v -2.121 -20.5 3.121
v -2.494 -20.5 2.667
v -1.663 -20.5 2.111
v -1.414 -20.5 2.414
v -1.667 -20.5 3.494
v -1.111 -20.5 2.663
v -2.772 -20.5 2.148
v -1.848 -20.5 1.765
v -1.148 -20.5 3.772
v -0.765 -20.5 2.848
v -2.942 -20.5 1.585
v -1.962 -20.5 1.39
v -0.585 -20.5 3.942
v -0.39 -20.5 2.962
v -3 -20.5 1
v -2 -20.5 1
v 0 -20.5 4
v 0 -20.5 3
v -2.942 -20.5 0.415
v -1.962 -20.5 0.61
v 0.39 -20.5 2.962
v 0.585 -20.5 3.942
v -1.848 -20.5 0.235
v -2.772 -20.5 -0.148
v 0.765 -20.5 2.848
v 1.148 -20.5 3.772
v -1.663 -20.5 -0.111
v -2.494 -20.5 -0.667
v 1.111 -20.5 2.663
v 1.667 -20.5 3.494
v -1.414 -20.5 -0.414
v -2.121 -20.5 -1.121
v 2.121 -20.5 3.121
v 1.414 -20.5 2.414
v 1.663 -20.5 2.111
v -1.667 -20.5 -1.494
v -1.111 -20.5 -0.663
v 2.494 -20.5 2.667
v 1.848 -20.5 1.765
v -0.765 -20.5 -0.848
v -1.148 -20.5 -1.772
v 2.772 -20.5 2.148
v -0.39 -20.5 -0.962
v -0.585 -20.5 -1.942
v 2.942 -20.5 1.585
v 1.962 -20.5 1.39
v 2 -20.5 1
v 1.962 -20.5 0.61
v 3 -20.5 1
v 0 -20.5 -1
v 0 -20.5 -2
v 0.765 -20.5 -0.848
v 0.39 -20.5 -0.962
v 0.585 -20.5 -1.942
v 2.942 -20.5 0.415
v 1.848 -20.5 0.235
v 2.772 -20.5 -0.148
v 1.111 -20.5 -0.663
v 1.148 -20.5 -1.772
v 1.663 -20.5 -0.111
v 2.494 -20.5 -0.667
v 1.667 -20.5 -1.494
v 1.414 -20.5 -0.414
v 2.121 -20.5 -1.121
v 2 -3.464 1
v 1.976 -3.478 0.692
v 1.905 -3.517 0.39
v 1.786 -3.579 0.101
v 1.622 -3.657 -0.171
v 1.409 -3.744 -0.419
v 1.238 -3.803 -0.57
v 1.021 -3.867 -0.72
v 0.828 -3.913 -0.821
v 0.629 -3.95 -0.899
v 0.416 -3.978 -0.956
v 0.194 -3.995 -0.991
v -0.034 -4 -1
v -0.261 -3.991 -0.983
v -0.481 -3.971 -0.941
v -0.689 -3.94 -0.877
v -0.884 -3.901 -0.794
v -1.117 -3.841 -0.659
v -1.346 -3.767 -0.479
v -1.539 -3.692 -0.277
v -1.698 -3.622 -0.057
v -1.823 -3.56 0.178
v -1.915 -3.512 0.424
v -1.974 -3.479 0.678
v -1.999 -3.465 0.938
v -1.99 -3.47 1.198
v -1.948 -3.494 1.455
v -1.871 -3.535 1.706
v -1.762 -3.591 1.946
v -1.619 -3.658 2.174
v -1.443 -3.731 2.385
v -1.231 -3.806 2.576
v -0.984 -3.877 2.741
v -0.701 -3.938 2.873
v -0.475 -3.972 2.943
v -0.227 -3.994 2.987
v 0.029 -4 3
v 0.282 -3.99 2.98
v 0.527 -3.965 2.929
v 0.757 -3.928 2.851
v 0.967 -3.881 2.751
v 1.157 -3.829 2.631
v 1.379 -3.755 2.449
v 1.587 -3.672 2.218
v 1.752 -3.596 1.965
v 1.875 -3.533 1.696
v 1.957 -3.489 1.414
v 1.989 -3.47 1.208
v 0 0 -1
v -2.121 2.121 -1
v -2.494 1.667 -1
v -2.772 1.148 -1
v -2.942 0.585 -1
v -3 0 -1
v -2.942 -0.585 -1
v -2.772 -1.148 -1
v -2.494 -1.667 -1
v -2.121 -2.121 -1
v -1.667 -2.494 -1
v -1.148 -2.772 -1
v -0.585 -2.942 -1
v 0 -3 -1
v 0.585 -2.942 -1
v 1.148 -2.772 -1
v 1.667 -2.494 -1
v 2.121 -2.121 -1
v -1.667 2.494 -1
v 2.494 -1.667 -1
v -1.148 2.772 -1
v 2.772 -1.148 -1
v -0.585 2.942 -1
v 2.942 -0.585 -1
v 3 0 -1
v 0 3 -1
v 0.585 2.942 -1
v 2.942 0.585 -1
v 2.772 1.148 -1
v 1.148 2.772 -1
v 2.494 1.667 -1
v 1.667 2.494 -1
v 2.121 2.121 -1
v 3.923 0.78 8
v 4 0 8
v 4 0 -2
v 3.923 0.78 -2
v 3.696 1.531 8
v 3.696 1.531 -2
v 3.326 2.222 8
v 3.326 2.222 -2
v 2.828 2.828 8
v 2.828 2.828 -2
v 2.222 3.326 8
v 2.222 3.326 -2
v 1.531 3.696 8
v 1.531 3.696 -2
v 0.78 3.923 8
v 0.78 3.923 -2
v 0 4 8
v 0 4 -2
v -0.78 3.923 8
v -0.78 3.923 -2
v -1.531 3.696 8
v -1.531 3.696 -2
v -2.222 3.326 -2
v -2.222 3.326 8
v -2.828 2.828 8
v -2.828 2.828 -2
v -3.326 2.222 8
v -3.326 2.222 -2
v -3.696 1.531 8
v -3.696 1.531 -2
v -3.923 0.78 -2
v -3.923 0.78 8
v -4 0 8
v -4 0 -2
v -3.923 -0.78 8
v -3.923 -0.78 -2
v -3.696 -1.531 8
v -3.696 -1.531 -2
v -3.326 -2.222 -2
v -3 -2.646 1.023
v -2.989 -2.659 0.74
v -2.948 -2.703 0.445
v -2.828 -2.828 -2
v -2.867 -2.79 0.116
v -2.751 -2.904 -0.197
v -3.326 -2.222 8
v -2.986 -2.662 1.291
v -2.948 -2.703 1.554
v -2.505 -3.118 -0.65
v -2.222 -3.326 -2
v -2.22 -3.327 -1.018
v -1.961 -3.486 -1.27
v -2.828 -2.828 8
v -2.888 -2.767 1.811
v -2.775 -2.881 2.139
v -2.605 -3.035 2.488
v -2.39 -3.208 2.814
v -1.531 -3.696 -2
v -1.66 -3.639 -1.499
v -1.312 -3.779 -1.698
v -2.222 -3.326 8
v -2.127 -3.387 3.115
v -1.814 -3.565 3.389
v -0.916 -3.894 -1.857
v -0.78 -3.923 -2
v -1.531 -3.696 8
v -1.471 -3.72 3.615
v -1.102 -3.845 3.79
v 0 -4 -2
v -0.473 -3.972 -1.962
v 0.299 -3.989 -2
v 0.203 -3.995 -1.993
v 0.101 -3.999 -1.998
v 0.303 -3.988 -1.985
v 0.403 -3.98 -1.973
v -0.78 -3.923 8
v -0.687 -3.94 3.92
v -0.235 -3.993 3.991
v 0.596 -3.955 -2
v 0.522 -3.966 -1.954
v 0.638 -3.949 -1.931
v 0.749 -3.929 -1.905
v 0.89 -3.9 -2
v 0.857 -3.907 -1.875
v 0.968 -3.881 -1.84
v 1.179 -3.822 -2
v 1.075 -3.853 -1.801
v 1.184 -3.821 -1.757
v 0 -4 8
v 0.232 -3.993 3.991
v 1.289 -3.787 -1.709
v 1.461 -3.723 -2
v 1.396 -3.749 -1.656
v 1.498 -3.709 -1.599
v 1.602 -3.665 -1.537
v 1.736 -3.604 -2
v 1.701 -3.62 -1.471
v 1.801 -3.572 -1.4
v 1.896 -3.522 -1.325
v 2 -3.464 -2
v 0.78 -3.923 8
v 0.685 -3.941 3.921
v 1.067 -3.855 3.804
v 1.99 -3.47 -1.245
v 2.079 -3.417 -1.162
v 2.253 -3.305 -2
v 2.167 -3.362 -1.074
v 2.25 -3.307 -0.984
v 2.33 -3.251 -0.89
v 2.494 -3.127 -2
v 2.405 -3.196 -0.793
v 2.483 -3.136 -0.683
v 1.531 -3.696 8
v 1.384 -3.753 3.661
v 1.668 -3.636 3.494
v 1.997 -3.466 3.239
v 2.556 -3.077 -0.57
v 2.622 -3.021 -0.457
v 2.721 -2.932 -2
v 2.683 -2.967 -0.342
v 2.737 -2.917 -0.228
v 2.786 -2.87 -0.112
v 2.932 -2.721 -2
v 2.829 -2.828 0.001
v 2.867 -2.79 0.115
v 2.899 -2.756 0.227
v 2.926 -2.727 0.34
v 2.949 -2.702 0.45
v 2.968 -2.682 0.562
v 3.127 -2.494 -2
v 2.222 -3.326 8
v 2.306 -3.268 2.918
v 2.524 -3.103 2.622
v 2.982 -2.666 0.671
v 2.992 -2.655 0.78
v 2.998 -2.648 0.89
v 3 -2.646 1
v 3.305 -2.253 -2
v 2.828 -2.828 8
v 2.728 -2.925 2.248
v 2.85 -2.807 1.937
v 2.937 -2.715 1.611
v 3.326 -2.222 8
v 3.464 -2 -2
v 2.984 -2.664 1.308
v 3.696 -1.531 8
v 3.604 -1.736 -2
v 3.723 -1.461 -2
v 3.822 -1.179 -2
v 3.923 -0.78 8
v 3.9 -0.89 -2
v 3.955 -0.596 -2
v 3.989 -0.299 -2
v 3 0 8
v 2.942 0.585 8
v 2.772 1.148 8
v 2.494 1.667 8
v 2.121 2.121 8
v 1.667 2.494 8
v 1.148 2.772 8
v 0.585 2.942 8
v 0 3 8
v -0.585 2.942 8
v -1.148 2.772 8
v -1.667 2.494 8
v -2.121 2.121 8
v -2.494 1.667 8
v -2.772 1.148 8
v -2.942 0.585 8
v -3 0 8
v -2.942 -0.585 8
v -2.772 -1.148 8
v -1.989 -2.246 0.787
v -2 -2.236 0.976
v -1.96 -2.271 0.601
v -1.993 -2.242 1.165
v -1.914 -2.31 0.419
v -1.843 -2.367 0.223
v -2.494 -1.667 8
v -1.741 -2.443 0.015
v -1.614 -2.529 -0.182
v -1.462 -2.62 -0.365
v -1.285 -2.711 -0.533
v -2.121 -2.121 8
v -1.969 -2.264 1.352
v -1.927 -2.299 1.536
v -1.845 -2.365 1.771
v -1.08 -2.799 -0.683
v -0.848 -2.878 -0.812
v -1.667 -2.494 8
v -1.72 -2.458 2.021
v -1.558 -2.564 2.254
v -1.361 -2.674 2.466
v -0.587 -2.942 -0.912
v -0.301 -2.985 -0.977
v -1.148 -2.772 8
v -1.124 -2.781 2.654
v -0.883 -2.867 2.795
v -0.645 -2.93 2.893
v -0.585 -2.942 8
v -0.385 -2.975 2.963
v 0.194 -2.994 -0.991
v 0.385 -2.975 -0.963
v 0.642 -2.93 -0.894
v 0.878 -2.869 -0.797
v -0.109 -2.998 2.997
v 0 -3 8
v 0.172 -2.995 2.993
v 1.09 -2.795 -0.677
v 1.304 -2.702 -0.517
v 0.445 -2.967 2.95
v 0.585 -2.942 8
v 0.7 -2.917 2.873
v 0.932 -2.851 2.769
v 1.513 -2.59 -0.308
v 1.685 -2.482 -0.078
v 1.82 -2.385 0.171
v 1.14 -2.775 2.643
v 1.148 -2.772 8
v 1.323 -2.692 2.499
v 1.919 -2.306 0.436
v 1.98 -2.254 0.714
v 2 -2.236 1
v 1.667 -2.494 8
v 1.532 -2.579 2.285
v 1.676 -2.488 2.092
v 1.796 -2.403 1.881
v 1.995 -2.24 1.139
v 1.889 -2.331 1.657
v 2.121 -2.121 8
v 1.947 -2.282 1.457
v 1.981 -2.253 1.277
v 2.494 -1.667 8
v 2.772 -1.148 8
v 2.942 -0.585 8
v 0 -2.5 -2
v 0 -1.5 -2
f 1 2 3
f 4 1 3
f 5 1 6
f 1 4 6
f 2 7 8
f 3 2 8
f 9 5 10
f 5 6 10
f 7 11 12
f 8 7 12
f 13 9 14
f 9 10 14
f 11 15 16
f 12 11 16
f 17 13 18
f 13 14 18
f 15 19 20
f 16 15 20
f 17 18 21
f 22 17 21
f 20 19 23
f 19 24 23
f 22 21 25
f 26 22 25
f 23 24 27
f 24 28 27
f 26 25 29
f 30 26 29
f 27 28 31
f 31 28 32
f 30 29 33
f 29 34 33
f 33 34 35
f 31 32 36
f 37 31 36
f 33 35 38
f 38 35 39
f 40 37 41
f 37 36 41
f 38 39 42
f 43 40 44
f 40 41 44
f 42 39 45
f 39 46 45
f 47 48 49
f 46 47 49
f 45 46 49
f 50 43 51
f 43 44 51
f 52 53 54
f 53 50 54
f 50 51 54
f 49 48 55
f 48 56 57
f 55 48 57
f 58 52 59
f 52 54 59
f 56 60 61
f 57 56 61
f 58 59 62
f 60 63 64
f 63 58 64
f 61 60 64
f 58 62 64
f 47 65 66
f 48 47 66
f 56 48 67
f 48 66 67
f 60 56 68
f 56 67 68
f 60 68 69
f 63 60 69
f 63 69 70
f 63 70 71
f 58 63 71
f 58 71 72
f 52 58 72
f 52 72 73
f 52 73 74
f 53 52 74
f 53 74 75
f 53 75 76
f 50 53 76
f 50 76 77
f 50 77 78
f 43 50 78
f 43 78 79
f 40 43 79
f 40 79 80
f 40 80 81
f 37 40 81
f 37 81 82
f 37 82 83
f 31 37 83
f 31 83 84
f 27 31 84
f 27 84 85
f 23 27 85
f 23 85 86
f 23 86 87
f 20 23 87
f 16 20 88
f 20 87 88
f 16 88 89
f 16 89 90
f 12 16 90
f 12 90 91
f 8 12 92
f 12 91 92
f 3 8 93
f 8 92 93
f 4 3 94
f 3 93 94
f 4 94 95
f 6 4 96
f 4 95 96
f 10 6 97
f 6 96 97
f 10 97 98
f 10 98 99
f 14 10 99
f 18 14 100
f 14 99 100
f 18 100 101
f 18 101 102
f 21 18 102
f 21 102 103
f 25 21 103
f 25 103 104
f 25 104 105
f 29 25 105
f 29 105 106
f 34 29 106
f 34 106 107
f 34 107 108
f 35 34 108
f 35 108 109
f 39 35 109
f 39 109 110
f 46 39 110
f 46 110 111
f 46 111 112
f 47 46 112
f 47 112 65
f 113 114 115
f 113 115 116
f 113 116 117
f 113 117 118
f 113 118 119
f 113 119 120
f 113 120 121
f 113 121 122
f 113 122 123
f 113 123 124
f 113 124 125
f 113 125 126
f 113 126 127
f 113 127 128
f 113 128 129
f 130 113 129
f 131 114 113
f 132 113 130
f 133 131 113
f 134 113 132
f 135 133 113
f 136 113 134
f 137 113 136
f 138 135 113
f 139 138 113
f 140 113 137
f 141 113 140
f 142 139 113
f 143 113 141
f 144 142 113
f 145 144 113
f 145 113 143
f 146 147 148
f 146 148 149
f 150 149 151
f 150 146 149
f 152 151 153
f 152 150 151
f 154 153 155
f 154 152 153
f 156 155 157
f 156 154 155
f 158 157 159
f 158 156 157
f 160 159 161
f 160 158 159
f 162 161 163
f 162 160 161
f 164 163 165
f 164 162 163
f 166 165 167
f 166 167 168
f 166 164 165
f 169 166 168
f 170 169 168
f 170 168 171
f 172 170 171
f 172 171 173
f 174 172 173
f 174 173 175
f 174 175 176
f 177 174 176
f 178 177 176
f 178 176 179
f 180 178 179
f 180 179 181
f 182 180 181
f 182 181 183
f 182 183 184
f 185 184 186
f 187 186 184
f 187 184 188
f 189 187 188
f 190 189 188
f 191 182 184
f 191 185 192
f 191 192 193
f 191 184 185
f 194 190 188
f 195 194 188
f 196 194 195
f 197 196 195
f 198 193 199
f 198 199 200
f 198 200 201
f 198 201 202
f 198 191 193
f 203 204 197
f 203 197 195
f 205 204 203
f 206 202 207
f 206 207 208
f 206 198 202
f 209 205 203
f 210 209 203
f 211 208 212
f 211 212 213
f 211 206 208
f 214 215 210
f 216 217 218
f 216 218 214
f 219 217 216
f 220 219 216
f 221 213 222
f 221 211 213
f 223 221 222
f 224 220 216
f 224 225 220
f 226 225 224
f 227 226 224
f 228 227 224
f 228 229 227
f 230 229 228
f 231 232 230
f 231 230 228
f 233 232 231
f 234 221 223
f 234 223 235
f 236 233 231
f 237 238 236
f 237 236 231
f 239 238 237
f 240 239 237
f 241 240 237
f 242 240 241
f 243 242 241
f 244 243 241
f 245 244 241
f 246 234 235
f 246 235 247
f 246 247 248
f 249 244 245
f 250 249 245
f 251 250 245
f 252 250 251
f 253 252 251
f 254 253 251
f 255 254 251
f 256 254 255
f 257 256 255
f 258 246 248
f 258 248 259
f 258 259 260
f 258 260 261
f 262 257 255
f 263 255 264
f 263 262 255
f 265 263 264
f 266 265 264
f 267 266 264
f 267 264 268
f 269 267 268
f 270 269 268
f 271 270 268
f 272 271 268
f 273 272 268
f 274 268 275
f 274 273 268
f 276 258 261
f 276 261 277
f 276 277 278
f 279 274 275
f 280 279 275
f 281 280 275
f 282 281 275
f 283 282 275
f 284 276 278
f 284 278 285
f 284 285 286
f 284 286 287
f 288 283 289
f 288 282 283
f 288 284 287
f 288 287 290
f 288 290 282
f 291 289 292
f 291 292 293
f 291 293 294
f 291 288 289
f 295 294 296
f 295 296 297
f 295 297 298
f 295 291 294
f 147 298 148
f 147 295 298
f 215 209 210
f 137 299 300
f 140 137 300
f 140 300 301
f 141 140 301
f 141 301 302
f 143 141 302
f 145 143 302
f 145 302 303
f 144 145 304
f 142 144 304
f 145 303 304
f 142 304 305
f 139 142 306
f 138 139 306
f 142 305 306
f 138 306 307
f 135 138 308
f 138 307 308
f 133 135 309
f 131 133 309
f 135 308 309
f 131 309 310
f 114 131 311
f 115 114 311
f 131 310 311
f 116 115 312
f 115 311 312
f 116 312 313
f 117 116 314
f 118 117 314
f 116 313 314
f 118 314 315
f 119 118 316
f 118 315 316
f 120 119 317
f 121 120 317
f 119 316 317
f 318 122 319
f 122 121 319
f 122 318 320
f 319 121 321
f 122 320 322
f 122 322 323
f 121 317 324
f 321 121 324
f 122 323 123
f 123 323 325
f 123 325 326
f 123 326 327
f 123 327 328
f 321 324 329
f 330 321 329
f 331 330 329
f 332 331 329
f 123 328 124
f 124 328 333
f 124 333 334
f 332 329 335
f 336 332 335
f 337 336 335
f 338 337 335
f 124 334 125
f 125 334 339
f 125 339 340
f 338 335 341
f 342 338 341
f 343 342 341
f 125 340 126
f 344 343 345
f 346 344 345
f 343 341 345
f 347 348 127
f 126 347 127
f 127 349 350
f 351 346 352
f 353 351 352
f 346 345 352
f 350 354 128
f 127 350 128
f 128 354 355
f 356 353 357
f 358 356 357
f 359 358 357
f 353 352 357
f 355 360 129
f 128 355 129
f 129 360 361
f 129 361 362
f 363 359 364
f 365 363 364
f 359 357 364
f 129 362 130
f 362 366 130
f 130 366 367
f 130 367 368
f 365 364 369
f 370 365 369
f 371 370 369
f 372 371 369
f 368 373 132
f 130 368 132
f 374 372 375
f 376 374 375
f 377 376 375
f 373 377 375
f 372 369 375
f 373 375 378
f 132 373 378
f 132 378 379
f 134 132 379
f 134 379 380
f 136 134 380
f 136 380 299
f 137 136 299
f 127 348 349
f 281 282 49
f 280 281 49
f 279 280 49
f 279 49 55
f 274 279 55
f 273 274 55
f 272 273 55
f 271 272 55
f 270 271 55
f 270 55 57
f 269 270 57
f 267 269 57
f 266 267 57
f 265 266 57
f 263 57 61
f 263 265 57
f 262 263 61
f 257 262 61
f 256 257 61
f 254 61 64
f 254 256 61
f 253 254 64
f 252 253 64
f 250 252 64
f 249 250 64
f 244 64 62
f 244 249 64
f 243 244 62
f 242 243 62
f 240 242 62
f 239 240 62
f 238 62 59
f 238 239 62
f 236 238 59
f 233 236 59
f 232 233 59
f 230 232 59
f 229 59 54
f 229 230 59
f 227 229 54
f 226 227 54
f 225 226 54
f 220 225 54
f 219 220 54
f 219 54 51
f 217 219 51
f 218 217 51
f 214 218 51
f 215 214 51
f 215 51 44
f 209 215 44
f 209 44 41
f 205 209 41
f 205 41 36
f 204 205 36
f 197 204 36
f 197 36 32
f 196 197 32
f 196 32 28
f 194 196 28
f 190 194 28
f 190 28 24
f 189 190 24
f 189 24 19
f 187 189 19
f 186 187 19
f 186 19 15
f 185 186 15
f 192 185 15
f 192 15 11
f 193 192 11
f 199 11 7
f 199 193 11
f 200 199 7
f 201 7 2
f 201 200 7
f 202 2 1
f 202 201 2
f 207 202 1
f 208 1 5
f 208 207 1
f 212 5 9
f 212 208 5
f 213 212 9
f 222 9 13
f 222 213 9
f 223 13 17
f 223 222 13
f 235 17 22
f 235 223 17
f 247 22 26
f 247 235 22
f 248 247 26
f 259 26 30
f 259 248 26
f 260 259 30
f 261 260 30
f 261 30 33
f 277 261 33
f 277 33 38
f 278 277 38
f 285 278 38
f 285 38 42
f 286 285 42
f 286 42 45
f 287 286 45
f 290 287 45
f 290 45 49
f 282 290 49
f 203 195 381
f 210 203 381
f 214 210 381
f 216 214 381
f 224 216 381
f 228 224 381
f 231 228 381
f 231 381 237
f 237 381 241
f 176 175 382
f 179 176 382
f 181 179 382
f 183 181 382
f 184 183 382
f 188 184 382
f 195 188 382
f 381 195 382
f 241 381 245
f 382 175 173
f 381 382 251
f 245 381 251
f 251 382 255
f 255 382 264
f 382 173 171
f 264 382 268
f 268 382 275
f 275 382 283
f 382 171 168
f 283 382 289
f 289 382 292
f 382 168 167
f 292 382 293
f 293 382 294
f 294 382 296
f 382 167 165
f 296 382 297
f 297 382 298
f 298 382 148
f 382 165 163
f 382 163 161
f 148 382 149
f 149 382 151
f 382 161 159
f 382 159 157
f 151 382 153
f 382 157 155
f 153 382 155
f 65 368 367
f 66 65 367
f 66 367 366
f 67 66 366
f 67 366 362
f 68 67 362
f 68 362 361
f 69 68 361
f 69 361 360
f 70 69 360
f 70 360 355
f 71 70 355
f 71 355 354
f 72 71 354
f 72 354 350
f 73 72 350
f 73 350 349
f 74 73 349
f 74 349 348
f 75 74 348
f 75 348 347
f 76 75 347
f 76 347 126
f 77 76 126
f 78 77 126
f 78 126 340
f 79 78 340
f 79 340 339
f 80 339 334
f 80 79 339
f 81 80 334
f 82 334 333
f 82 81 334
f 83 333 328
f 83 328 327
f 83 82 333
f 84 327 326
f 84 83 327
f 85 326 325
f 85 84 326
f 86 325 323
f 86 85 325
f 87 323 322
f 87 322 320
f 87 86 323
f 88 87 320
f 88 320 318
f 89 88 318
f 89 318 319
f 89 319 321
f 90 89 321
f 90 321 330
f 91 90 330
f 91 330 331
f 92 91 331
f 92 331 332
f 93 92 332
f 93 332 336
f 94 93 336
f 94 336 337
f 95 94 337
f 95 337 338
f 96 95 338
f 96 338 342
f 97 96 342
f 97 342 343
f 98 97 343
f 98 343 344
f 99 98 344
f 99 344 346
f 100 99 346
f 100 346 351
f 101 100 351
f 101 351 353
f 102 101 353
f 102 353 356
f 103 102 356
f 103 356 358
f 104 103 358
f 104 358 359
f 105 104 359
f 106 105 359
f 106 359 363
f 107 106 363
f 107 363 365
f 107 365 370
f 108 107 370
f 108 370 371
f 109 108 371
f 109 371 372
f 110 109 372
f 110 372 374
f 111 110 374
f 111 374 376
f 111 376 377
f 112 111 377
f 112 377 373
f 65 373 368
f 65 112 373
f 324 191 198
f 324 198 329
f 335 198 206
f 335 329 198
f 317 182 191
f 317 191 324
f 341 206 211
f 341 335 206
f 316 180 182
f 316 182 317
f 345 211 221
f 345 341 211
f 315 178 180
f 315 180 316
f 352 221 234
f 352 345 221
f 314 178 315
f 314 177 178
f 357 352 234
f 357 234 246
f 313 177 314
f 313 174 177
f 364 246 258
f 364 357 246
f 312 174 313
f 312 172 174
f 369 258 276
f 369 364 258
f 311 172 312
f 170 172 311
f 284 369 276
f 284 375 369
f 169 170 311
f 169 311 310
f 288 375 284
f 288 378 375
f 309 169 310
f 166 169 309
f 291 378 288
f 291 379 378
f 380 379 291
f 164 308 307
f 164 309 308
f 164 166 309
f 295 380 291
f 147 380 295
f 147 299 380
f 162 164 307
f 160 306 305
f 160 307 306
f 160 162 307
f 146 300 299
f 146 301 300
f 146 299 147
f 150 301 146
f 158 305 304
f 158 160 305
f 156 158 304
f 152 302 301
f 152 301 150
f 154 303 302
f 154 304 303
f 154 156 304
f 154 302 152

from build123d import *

# Parameters (mm, degrees)
ESQUISSE1_R             = 4
BOSS_EXTRU_1_DEPTH      = 8
BOSS_EXTRU_1_DEPTH_BACK = 2
ESQUISSE4_R             = 2
ENL_V_MAT_EXTRU_2_DEPTH = 18
BOSS_EXTRU_2_START      = -2.5
ESQUISSE3_R             = 3
ESQUISSE3_R_2           = 2
BOSS_EXTRU_2_DEPTH      = 1
BOSS_EXTRU_2_DEPTH_BACK = 18
ESQUISSE2_R             = 3
ENL_V_MAT_EXTRU_3_DEPTH = 9


with BuildPart() as part:
    # Esquisse1 → Boss.-Extru.1 (new body, two sides)
    with BuildSketch(Plane.XY) as boss_extru_1_sk:
        Circle(ESQUISSE1_R)
    extrude(amount=BOSS_EXTRU_1_DEPTH)
    extrude(boss_extru_1_sk.sketch, amount=-BOSS_EXTRU_1_DEPTH_BACK)

    # Esquisse4 → Enlèv. mat.-Extru.2 (cut)
    with BuildSketch(Plane(origin=(0, 0, 0), x_dir=(1, 0, 0), z_dir=(0, 1, 0))):
        with Locations((0, -1)):
            Circle(ESQUISSE4_R)
    extrude(amount=-ENL_V_MAT_EXTRU_2_DEPTH, mode=Mode.SUBTRACT)

    # Esquisse3 → Boss.-Extru.2 (add, two sides)
    with BuildSketch(Plane(origin=(0, 0, 0), x_dir=(1, 0, 0), z_dir=(0, 1, 0)).offset(BOSS_EXTRU_2_START)) as boss_extru_2_sk:
        with Locations((0, -1)):
            Circle(ESQUISSE3_R)
        with Locations((0, -1)):
            Circle(ESQUISSE3_R_2, mode=Mode.SUBTRACT)
    extrude(amount=BOSS_EXTRU_2_DEPTH)
    extrude(boss_extru_2_sk.sketch, amount=-BOSS_EXTRU_2_DEPTH_BACK)

    # Esquisse2 → Enlèv. mat.-Extru.3 (cut)
    with BuildSketch(Plane.XY.offset(8)):
        Circle(ESQUISSE2_R)
    extrude(amount=-ENL_V_MAT_EXTRU_3_DEPTH, mode=Mode.SUBTRACT)


solid = part.part
